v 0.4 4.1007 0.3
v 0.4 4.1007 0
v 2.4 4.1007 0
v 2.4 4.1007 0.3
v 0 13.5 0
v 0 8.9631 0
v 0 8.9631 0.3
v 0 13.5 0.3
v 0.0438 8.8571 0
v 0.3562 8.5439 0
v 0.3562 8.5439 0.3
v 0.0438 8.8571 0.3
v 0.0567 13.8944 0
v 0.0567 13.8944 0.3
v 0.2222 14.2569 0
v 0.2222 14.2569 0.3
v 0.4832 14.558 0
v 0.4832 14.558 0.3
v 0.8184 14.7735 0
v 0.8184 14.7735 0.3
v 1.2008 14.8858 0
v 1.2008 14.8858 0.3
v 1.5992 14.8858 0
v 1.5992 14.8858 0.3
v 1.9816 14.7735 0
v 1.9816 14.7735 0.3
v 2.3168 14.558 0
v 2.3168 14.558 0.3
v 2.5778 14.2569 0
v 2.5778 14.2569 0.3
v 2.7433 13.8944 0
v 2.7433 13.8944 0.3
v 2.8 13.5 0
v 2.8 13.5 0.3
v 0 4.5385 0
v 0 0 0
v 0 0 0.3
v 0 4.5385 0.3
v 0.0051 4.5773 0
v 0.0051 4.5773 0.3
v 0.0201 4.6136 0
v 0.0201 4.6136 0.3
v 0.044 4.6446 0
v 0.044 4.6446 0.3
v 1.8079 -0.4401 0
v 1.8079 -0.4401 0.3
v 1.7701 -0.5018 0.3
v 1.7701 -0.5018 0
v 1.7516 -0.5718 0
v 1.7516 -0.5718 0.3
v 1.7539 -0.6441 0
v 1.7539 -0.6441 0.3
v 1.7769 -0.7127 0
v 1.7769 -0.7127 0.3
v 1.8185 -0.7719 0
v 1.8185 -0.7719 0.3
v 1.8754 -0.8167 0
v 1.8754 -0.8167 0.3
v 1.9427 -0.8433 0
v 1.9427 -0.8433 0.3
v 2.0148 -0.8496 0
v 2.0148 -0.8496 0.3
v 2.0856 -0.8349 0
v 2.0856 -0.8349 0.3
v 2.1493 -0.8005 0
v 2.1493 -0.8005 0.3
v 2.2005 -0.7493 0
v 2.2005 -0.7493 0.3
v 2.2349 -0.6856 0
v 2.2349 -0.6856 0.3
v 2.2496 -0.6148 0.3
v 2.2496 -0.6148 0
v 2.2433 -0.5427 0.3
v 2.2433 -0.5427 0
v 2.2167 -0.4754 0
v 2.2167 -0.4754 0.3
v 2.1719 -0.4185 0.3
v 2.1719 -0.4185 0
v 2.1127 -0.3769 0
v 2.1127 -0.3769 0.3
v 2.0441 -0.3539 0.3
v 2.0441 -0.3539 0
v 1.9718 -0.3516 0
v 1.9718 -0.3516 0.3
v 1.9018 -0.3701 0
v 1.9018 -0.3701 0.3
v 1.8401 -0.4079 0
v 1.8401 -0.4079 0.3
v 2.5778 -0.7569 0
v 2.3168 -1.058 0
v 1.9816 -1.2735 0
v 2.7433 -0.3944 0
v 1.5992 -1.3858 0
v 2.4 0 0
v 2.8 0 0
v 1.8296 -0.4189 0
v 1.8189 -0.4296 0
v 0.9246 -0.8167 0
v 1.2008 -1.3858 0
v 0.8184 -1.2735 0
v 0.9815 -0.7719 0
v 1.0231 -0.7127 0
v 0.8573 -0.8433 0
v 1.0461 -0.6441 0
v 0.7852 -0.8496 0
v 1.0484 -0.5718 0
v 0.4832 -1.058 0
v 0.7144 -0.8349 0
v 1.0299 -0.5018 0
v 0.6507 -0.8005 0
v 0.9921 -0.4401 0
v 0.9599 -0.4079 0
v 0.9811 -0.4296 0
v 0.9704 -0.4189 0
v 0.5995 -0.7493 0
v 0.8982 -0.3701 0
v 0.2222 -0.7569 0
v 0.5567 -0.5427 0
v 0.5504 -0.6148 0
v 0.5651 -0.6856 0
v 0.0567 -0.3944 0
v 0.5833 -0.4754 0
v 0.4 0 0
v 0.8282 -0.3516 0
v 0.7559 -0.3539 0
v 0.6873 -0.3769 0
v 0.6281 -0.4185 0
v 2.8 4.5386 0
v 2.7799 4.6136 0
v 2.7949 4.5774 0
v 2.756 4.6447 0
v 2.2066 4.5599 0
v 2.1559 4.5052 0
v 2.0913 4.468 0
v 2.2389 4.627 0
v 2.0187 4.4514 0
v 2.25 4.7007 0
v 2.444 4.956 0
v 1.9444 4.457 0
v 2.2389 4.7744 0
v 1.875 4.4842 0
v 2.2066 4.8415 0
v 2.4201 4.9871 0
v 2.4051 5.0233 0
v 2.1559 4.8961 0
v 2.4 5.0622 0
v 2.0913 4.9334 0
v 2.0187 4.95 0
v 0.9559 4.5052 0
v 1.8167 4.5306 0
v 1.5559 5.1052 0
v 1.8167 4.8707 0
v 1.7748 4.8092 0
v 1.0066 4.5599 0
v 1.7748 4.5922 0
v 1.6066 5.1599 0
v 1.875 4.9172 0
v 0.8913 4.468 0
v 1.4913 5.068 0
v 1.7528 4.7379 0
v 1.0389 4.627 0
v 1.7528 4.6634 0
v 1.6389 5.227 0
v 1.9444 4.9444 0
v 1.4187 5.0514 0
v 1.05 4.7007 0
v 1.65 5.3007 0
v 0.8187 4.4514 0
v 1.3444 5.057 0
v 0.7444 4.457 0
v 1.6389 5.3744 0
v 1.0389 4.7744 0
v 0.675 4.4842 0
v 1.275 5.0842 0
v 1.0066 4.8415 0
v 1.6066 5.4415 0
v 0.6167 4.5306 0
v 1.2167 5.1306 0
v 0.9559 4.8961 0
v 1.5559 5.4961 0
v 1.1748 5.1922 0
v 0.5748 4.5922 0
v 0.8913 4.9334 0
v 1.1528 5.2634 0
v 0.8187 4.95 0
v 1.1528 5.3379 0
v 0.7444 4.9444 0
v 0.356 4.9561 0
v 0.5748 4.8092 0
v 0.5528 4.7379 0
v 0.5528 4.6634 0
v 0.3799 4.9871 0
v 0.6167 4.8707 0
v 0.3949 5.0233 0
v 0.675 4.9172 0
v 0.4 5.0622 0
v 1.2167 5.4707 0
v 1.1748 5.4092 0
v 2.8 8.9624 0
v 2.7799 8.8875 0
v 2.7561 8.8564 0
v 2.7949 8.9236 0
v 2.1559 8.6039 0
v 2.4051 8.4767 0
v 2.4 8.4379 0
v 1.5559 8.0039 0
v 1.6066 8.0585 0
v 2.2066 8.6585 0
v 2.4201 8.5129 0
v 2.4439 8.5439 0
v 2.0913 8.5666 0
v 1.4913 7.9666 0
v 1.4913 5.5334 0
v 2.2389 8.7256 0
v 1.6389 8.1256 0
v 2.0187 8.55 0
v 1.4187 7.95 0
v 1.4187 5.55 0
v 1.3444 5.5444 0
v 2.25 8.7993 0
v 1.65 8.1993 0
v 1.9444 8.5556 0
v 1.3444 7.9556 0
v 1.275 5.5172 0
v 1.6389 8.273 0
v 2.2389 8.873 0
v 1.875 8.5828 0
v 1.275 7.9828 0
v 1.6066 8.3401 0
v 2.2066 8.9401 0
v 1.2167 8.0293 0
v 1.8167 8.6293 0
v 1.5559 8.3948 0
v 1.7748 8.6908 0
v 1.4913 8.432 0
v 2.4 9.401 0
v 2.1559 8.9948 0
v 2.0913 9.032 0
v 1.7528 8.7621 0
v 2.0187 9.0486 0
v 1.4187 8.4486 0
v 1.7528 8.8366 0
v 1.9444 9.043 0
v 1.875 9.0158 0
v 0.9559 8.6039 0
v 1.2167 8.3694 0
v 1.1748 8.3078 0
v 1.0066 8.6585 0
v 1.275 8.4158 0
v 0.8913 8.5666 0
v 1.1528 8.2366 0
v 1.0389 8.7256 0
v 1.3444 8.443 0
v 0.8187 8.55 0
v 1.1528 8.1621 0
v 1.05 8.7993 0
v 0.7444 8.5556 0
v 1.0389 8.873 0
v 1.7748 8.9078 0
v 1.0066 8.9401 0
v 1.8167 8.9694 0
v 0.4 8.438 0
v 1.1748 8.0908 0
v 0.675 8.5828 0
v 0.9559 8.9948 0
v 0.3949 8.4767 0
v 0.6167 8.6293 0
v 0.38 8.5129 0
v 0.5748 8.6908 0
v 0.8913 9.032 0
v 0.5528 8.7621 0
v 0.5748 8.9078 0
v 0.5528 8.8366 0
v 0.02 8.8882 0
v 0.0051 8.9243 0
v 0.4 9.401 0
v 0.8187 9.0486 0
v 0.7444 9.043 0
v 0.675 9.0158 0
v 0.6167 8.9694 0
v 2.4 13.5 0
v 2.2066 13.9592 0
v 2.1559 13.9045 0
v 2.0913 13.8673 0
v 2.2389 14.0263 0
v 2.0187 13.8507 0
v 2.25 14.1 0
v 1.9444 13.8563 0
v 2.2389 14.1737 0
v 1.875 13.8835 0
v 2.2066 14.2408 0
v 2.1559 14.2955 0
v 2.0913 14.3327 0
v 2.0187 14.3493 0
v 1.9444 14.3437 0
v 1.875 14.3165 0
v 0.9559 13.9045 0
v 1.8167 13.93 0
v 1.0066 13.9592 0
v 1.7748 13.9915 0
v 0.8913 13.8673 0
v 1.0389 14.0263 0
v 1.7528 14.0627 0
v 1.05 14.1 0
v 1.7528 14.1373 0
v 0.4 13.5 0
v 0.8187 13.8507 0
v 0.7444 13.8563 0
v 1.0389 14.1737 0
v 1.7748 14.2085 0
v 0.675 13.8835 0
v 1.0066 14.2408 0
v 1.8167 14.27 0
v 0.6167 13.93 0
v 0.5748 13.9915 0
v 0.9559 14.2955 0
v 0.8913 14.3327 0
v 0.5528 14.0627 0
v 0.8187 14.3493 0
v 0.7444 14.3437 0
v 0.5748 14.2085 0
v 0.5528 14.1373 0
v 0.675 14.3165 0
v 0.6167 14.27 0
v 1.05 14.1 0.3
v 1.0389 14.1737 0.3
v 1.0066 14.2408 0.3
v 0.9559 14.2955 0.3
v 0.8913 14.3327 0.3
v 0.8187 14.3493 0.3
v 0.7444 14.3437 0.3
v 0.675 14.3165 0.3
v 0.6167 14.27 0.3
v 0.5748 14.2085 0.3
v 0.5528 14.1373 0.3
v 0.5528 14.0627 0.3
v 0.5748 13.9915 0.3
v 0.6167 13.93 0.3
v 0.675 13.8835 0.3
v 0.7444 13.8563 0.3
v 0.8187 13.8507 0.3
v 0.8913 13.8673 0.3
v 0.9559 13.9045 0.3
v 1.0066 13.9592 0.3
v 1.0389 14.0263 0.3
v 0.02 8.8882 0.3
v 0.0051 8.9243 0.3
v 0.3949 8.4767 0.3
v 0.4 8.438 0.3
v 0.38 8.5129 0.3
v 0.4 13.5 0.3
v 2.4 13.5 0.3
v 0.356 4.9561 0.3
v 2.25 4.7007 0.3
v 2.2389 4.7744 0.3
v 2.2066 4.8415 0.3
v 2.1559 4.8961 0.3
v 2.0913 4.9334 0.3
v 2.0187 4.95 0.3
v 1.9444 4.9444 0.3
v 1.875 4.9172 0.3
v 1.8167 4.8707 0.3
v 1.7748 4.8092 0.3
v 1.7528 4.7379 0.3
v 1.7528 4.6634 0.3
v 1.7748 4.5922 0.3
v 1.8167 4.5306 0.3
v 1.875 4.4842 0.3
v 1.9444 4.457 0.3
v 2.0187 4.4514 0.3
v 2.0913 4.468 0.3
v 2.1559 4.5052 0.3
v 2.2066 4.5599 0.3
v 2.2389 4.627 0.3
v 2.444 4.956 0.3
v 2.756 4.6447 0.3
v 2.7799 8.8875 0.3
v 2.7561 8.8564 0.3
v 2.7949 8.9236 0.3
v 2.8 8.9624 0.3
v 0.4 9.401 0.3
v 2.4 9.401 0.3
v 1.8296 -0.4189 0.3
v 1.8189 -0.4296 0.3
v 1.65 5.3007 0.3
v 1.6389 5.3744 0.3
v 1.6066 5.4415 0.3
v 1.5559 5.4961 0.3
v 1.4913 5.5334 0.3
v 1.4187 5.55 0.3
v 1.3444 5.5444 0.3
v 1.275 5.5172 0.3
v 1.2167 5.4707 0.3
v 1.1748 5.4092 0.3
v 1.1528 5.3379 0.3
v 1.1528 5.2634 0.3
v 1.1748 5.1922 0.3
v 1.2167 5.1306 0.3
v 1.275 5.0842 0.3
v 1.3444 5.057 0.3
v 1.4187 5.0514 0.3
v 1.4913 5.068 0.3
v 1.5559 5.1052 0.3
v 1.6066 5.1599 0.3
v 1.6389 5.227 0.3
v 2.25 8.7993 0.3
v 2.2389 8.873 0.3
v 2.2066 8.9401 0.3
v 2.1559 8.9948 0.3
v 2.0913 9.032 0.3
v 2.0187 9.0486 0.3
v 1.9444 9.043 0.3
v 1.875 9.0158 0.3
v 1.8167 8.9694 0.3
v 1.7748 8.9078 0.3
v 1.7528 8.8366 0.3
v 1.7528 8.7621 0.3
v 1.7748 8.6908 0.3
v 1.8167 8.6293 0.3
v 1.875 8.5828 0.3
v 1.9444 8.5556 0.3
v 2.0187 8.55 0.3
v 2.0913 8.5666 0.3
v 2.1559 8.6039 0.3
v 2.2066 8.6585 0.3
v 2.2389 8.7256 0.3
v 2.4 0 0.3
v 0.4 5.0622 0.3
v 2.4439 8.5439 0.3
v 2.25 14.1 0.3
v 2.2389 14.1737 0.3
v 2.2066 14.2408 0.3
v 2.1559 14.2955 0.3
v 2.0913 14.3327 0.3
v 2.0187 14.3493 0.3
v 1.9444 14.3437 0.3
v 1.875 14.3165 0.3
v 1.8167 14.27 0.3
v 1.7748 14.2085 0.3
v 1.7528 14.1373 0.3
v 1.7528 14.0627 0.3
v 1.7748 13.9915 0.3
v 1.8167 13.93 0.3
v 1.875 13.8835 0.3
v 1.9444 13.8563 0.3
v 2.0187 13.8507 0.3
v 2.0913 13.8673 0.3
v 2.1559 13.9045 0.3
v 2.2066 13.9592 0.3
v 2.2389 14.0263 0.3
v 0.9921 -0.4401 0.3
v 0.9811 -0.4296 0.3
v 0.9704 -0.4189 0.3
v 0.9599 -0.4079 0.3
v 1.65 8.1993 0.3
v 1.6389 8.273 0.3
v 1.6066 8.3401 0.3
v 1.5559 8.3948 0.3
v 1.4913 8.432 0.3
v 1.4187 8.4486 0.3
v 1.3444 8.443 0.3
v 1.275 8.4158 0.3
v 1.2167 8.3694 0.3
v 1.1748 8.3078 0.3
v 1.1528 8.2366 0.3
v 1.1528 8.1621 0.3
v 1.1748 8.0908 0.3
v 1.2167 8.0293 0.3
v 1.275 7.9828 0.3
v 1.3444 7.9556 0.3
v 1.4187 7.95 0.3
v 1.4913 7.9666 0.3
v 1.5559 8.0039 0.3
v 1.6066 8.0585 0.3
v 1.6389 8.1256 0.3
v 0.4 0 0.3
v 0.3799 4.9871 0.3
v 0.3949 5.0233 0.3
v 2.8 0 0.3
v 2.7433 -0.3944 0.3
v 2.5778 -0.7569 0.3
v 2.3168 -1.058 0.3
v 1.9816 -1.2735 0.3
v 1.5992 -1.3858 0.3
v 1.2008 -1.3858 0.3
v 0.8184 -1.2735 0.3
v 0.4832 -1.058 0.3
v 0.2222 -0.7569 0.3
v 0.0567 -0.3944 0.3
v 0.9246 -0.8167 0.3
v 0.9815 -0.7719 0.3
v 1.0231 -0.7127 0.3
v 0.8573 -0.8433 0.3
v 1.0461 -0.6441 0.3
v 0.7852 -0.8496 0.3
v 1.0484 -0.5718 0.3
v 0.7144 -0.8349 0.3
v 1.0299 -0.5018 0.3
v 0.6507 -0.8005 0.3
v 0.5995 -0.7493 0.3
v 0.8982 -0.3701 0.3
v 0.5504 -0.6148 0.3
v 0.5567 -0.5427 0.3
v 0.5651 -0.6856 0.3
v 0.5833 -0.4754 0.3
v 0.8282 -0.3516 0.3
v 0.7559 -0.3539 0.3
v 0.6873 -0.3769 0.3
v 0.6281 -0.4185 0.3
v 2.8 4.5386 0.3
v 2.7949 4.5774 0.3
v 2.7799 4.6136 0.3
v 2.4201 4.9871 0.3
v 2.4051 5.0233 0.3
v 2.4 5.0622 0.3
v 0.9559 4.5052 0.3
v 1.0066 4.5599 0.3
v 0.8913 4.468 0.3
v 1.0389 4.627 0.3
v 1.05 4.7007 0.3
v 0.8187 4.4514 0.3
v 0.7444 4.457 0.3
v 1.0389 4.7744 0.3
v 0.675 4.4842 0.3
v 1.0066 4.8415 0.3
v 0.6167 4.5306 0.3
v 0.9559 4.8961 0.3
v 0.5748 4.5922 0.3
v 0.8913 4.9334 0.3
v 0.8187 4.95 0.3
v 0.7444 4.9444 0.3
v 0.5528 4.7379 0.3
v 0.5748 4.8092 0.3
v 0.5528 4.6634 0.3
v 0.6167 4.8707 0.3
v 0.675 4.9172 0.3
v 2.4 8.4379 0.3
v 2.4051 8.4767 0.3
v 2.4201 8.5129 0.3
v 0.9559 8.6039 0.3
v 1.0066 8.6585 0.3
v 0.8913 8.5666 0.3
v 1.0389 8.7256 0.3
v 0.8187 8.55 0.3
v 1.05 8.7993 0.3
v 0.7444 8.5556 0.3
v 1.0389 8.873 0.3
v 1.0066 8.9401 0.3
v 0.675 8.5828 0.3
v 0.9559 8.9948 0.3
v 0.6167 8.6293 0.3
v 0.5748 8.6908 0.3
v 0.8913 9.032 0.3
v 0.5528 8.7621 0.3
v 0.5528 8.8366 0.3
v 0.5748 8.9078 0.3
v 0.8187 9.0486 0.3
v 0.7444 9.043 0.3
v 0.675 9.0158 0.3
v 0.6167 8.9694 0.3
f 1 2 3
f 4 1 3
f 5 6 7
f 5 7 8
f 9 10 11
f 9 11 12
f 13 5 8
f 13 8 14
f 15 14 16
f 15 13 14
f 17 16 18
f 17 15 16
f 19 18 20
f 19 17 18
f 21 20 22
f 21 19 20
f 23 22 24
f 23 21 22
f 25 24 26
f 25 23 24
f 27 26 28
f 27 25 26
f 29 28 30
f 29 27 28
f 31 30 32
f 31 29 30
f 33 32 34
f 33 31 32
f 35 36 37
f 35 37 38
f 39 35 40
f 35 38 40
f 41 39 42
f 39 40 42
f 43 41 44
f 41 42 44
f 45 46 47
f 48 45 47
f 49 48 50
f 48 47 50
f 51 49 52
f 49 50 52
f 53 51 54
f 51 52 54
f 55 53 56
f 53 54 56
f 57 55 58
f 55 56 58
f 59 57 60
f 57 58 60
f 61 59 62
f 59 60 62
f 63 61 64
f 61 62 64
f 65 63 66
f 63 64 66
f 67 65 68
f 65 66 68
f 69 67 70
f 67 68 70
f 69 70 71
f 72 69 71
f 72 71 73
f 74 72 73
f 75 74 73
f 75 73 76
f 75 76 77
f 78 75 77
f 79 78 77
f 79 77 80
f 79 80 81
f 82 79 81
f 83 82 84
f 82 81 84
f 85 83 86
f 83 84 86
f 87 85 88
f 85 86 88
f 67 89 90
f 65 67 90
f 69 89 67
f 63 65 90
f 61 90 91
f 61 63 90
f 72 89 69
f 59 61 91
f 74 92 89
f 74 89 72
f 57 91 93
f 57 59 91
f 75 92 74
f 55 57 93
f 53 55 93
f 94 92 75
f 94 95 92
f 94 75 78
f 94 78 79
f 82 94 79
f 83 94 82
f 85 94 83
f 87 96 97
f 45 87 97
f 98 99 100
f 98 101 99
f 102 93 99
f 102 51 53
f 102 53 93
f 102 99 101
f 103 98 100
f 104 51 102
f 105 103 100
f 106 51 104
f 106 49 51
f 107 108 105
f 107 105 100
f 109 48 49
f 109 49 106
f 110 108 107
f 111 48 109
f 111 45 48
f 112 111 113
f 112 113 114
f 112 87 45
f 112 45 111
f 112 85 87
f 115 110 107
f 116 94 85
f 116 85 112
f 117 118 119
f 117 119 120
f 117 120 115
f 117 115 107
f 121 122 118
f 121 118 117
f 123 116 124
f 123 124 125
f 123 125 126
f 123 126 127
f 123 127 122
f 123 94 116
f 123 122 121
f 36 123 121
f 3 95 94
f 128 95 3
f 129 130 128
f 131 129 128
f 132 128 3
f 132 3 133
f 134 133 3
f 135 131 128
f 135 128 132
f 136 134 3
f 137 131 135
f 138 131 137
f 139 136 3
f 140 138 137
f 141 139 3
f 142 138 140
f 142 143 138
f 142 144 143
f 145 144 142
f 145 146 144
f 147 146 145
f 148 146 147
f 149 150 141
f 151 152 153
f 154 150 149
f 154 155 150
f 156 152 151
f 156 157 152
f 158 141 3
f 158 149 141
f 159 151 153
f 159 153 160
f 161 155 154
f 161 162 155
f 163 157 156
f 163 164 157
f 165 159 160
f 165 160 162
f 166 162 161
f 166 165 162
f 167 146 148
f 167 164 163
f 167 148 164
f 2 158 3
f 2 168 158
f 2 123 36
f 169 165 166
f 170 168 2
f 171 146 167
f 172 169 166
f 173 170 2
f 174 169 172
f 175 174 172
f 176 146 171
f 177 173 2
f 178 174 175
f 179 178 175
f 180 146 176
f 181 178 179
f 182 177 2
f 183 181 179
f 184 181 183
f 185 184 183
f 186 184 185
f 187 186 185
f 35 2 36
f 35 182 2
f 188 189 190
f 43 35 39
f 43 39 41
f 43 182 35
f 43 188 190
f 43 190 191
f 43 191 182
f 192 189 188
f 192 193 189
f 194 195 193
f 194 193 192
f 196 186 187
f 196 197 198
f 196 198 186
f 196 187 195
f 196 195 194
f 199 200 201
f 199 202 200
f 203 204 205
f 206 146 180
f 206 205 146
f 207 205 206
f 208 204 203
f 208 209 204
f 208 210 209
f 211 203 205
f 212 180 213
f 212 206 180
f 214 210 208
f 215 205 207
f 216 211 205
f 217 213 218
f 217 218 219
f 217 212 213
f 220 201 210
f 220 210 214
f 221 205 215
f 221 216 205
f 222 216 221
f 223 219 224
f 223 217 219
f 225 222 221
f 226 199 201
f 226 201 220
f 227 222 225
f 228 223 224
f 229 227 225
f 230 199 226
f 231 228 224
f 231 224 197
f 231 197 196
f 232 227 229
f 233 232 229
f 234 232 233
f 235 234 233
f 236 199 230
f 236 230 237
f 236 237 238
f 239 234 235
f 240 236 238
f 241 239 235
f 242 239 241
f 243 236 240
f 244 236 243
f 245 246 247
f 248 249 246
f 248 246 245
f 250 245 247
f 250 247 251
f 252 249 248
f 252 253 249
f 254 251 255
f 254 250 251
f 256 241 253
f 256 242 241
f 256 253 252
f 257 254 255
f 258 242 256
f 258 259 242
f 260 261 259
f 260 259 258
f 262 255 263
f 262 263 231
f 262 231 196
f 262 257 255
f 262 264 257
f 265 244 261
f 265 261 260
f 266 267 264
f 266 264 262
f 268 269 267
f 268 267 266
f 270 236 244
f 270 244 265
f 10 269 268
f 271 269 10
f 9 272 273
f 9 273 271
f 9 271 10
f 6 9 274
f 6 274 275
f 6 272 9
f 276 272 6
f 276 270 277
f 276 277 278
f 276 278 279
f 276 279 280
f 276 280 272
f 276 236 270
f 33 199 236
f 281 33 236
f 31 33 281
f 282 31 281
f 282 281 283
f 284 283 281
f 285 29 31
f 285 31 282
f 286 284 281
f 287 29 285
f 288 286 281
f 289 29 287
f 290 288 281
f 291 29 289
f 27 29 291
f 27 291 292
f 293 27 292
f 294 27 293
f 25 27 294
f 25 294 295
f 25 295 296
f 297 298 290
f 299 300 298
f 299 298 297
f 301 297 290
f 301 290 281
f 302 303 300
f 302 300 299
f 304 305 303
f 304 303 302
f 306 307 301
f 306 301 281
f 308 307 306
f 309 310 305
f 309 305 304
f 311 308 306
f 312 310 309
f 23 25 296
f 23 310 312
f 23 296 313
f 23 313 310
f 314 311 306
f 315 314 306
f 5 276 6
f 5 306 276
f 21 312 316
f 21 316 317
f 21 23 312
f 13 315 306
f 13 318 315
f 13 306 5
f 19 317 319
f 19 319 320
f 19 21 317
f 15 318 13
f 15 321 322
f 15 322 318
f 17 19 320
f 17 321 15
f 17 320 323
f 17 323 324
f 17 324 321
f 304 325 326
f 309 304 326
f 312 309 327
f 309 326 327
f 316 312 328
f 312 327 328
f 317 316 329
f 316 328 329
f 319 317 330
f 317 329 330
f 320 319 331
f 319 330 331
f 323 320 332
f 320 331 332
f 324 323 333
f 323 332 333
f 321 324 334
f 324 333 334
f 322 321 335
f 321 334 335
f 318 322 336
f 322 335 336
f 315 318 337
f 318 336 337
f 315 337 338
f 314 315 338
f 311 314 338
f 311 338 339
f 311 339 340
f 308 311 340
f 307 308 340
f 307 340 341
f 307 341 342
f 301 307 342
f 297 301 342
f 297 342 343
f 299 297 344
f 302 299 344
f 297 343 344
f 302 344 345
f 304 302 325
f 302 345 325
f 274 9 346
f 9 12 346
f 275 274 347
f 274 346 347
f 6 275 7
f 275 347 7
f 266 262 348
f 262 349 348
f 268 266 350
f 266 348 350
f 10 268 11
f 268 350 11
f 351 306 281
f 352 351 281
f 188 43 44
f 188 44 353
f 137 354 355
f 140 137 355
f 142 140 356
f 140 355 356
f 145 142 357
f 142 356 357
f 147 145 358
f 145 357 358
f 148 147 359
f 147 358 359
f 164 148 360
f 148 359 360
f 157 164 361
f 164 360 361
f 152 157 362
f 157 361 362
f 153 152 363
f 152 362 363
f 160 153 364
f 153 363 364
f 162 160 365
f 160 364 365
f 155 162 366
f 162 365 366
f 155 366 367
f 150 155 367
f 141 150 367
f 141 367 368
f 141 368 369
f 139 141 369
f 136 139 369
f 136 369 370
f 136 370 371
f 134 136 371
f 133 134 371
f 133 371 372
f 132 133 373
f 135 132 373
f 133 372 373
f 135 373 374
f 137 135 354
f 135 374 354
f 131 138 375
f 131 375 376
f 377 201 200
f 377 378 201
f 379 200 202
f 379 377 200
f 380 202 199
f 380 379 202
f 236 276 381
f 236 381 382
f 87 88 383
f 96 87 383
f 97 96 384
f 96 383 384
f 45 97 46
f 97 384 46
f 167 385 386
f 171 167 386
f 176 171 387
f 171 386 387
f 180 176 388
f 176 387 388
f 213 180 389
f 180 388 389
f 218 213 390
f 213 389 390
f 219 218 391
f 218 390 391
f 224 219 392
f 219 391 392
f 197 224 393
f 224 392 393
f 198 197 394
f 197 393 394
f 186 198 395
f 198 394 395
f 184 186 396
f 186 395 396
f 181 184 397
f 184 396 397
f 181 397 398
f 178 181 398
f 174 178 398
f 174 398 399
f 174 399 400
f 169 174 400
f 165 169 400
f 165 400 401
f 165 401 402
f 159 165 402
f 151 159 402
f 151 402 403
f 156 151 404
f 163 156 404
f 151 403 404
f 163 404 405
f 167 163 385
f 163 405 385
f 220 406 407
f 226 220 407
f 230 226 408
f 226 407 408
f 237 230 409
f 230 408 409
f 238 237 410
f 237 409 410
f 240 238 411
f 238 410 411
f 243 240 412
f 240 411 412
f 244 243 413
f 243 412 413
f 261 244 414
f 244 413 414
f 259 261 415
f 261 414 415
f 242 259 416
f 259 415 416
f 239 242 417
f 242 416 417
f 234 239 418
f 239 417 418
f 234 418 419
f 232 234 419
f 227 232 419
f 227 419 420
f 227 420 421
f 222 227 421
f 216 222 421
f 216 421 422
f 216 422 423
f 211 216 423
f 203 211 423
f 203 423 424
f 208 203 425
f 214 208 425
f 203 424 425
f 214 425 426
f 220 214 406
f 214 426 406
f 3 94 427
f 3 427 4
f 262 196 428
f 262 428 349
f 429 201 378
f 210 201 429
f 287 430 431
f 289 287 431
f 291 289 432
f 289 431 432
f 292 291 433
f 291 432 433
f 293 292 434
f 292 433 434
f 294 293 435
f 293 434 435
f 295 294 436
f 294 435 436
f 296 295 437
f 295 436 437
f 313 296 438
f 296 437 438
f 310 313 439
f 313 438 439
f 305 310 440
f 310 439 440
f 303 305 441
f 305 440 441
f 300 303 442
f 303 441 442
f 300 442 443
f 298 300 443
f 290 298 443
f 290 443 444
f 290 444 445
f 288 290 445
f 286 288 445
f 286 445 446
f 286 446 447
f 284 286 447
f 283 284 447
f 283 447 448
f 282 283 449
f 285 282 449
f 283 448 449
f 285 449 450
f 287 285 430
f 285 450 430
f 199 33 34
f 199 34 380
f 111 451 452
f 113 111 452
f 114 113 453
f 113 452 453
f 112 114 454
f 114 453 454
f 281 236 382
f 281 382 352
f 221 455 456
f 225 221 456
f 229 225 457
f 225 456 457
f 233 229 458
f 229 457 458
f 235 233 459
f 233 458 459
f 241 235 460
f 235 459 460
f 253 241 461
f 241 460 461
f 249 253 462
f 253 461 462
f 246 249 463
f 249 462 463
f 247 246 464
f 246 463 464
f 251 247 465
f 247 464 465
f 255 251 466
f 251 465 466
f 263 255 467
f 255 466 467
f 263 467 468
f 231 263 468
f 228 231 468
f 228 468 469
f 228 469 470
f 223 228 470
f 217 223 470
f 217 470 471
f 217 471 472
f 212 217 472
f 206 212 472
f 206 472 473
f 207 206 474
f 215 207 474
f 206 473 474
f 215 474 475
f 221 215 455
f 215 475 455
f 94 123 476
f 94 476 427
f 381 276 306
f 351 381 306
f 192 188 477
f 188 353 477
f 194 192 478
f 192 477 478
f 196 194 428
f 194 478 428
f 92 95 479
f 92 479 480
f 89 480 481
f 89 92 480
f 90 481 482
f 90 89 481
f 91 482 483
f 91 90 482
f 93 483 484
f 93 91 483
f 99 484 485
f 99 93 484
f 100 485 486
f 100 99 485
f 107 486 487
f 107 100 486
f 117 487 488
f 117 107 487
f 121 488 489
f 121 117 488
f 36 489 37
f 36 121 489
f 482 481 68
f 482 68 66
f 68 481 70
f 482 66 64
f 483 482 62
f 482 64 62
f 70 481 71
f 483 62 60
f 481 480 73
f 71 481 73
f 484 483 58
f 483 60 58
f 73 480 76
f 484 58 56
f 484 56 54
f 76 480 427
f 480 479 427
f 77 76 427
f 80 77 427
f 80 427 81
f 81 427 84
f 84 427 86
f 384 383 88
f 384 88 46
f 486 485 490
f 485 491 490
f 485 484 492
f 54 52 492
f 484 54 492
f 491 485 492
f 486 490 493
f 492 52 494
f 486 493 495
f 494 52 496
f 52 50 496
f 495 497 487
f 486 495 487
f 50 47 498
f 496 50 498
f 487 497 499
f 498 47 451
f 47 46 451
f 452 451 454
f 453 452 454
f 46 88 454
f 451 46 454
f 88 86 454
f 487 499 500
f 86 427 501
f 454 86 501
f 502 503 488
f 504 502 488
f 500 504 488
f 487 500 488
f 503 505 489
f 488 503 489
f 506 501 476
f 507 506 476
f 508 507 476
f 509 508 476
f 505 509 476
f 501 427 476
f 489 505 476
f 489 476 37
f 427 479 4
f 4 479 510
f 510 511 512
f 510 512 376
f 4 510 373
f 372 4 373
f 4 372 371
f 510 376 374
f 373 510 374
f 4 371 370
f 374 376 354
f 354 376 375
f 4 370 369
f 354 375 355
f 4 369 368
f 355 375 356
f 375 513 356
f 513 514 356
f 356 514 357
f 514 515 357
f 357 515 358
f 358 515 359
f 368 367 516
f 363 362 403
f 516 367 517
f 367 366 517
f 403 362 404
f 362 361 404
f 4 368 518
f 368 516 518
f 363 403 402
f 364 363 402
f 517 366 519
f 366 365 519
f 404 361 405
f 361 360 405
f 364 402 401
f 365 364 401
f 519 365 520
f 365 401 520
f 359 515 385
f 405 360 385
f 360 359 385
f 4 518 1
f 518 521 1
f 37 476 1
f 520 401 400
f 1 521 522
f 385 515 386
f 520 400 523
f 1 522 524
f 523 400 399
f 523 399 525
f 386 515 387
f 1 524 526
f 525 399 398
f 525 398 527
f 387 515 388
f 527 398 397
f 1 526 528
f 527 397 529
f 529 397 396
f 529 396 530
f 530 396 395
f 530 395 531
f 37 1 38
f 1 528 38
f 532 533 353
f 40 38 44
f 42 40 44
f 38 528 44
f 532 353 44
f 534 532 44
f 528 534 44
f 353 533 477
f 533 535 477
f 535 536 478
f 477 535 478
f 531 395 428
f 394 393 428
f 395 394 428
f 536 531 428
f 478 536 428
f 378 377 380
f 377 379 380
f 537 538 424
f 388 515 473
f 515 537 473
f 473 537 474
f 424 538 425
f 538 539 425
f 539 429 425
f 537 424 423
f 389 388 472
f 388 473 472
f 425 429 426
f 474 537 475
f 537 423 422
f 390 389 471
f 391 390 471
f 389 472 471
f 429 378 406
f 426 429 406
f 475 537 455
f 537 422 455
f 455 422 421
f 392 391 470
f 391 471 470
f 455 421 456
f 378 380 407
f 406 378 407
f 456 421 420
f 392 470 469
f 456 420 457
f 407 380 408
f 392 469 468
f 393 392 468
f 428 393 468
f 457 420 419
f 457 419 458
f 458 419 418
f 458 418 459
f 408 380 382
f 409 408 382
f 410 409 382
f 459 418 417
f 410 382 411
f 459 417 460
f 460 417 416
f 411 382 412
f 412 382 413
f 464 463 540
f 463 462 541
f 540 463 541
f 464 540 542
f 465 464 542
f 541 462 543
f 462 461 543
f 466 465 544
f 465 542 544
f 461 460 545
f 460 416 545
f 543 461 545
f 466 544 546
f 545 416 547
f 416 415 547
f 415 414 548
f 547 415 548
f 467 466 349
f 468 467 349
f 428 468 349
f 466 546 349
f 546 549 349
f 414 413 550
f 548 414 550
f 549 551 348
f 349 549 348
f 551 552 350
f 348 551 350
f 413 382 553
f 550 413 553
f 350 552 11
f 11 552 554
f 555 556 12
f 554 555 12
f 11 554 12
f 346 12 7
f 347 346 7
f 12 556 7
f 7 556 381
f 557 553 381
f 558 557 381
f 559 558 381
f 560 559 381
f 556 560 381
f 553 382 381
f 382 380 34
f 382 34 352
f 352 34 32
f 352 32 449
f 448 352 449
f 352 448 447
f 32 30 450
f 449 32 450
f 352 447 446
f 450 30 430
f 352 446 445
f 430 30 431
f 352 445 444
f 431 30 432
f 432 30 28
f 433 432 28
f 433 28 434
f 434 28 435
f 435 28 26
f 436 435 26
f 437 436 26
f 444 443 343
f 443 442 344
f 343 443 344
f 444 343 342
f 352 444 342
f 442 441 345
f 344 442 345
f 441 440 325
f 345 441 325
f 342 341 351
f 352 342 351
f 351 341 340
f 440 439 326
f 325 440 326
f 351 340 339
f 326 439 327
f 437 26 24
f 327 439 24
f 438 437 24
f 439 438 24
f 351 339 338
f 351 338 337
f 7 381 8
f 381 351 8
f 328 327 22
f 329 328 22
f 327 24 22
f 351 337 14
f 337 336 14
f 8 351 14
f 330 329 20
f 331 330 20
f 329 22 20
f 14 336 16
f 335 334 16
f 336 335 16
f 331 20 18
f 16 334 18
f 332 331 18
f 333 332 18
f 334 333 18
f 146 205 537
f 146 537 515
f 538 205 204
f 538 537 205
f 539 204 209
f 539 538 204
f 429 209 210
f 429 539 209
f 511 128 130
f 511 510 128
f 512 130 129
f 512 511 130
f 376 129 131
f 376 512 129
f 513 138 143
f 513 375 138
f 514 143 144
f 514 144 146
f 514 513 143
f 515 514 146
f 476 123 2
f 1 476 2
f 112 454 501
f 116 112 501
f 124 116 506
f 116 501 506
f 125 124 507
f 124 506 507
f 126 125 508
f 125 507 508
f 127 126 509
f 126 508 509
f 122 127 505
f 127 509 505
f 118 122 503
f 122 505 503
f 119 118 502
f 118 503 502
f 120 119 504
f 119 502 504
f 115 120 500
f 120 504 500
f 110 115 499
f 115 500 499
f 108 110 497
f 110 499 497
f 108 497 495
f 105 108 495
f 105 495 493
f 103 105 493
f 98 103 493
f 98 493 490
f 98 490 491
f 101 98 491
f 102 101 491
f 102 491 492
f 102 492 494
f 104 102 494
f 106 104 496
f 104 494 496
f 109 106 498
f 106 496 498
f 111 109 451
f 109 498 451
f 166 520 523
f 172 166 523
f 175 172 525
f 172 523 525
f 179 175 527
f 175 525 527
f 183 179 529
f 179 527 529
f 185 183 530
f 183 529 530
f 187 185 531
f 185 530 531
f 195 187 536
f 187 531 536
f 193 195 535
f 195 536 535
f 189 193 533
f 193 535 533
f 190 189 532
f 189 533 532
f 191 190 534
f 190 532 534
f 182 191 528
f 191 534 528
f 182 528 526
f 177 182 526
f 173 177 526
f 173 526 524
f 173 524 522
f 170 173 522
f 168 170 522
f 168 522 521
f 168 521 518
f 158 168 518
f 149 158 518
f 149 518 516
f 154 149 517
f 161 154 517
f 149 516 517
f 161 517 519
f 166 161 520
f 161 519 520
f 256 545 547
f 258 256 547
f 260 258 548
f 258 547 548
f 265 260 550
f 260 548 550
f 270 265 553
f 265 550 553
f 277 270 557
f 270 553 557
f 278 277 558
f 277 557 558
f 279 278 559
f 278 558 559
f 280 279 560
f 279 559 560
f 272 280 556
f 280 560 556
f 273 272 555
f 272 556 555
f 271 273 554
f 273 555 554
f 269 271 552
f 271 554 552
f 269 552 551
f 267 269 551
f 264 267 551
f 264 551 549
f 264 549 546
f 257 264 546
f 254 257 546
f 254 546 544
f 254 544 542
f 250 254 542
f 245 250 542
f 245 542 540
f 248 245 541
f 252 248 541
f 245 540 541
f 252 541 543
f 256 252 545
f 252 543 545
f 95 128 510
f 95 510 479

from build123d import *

# Parameters (mm, degrees)
SKETCH1_W           = 2
SKETCH1_H           = 4.09895497
SKETCH1_H_2         = 4.100689225
BOSS_EXTRUDE1_DEPTH = 0.3
SKETCH2_R           = 0.25
CUT_EXTRUDE2_DEPTH  = 0.3
FILLET10_R          = 0.15


with BuildPart() as part:
    # Sketch1 → Boss-Extrude1 (new body)
    with BuildSketch(Plane.XY):
        with BuildLine():
            Line((0, 0), (0, 4.600689225))
            Line((0, 4.600689225), (0.4, 5))
            Line((0.4, 5), (0.4, 8.5))
            Line((0.4, 8.5), (0, 8.90104503))
            Line((0, 8.90104503), (0, 13.5))
            ThreePointArc((0, 13.5), (1.4, 14.9), (2.8, 13.5))
            Line((2.8, 13.5), (2.8, 8.900318658))
            Line((2.8, 8.900318658), (2.4, 8.5))
            Line((2.4, 8.5), (2.4, 5))
            Line((2.4, 5), (2.8, 4.60077765))
            Line((2.8, 4.60077765), (2.8, 0))
            ThreePointArc((2.8, 0), (1.4, -1.4), (0, 0))
        make_face()
        with Locations((1.4, 11.450522515)):
            Rectangle(SKETCH1_W, SKETCH1_H, mode=Mode.SUBTRACT)
        with Locations((1.4, 2.050344612)):
            Rectangle(SKETCH1_W, SKETCH1_H_2, mode=Mode.SUBTRACT)
    extrude(amount=BOSS_EXTRUDE1_DEPTH)

    # Sketch2 → Cut-Extrude2 (cut)
    with BuildSketch(Plane.XY.offset(0.3)):
        with Locations((1.4, 8.199310775)):
            Circle(SKETCH2_R)
        with Locations((2, 14.1)):
            Circle(SKETCH2_R)
        with Locations((1.4, 5.300689225)):
            Circle(SKETCH2_R)
        with Locations((0.8, 14.1)):
            Circle(SKETCH2_R)
        with BuildLine():
            ThreePointArc((1.807854557, -0.440062109), (2.176776695, -0.776776695), (1.840062109, -0.407854557))
            ThreePointArc((1.840062109, -0.407854557), (1.824264069, -0.424264069), (1.807854557, -0.440062109))
        make_face()
        with BuildLine():
            ThreePointArc((0.992145443, -0.440062109), (0.975735931, -0.424264069), (0.959937891, -0.407854557))
            ThreePointArc((0.959937891, -0.407854557), (0.623223305, -0.776776695), (0.992145443, -0.440062109))
        make_face()
        with Locations((0.8, 4.700689225)):
            Circle(SKETCH2_R)
        with Locations((2, 4.700689225)):
            Circle(SKETCH2_R)
        with Locations((2, 8.799310775)):
            Circle(SKETCH2_R)
        with Locations((0.8, 8.799310775)):
            Circle(SKETCH2_R)
    extrude(amount=-CUT_EXTRUDE2_DEPTH, mode=Mode.SUBTRACT)

    # Fillet10
    fillet10_edges = [part.edges().sort_by_distance(p)[0] for p in [
        (0, 4.600689225, 0.15),
        (0.4, 5, 0.15),
        (0.4, 8.5, 0.15),
        (0, 8.90104503, 0.15),
        (2.8, 8.900318658, 0.15),
        (2.4, 8.5, 0.15),
        (2.4, 5, 0.15),
        (2.8, 4.60077765, 0.15),
    ]]
    fillet(fillet10_edges, radius=FILLET10_R)


solid = part.part
